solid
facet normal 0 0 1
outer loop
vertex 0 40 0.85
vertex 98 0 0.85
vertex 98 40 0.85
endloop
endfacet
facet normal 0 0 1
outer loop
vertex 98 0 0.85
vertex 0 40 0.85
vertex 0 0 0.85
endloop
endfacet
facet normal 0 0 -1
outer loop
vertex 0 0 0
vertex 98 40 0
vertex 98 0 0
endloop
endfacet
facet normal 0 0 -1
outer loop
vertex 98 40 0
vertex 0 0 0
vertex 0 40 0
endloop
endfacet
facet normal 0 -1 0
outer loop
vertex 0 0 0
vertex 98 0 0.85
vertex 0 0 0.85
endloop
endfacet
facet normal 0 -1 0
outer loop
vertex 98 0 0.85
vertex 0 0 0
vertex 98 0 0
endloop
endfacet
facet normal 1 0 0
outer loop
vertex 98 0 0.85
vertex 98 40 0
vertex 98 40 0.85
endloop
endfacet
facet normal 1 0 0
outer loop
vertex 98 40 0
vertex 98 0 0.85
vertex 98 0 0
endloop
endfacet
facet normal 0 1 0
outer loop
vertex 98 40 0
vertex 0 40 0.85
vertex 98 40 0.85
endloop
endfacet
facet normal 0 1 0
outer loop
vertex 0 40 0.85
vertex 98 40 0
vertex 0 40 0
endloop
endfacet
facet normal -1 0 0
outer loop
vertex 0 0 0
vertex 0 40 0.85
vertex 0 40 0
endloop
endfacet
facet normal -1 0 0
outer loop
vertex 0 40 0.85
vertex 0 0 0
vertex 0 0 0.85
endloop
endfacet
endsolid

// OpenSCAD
$fn=30;

//wingholder();
//batholder();
cube([98,40,.85]);

module wingholder()
{
	angle=[74,100];
	a=atan(angle[0]/angle[1]);
	height=1.5;
	width=[90,70];
	depth=10;

	translate([-width[0]/2,0,0])
		cube([width[0],depth,height]);

	for (i=[0:1])
	{
		mirror([i,0,0])
		translate([width[0]/2-0-depth*sin(a),depth-depth*cos(a),0])
			rotate(-a,[0,0,1])
				cube([width[1],depth,height]);
	}
}

module batholder()
{
	depth=23;
	width=40;
	height=[2,3];
	difference()
	{
		cube([width,depth,2*height[0]+height[1]]);
		translate([height[0],0,height[0]])
			cube([width-2*height[0],depth,height[1]]);
	}
}
